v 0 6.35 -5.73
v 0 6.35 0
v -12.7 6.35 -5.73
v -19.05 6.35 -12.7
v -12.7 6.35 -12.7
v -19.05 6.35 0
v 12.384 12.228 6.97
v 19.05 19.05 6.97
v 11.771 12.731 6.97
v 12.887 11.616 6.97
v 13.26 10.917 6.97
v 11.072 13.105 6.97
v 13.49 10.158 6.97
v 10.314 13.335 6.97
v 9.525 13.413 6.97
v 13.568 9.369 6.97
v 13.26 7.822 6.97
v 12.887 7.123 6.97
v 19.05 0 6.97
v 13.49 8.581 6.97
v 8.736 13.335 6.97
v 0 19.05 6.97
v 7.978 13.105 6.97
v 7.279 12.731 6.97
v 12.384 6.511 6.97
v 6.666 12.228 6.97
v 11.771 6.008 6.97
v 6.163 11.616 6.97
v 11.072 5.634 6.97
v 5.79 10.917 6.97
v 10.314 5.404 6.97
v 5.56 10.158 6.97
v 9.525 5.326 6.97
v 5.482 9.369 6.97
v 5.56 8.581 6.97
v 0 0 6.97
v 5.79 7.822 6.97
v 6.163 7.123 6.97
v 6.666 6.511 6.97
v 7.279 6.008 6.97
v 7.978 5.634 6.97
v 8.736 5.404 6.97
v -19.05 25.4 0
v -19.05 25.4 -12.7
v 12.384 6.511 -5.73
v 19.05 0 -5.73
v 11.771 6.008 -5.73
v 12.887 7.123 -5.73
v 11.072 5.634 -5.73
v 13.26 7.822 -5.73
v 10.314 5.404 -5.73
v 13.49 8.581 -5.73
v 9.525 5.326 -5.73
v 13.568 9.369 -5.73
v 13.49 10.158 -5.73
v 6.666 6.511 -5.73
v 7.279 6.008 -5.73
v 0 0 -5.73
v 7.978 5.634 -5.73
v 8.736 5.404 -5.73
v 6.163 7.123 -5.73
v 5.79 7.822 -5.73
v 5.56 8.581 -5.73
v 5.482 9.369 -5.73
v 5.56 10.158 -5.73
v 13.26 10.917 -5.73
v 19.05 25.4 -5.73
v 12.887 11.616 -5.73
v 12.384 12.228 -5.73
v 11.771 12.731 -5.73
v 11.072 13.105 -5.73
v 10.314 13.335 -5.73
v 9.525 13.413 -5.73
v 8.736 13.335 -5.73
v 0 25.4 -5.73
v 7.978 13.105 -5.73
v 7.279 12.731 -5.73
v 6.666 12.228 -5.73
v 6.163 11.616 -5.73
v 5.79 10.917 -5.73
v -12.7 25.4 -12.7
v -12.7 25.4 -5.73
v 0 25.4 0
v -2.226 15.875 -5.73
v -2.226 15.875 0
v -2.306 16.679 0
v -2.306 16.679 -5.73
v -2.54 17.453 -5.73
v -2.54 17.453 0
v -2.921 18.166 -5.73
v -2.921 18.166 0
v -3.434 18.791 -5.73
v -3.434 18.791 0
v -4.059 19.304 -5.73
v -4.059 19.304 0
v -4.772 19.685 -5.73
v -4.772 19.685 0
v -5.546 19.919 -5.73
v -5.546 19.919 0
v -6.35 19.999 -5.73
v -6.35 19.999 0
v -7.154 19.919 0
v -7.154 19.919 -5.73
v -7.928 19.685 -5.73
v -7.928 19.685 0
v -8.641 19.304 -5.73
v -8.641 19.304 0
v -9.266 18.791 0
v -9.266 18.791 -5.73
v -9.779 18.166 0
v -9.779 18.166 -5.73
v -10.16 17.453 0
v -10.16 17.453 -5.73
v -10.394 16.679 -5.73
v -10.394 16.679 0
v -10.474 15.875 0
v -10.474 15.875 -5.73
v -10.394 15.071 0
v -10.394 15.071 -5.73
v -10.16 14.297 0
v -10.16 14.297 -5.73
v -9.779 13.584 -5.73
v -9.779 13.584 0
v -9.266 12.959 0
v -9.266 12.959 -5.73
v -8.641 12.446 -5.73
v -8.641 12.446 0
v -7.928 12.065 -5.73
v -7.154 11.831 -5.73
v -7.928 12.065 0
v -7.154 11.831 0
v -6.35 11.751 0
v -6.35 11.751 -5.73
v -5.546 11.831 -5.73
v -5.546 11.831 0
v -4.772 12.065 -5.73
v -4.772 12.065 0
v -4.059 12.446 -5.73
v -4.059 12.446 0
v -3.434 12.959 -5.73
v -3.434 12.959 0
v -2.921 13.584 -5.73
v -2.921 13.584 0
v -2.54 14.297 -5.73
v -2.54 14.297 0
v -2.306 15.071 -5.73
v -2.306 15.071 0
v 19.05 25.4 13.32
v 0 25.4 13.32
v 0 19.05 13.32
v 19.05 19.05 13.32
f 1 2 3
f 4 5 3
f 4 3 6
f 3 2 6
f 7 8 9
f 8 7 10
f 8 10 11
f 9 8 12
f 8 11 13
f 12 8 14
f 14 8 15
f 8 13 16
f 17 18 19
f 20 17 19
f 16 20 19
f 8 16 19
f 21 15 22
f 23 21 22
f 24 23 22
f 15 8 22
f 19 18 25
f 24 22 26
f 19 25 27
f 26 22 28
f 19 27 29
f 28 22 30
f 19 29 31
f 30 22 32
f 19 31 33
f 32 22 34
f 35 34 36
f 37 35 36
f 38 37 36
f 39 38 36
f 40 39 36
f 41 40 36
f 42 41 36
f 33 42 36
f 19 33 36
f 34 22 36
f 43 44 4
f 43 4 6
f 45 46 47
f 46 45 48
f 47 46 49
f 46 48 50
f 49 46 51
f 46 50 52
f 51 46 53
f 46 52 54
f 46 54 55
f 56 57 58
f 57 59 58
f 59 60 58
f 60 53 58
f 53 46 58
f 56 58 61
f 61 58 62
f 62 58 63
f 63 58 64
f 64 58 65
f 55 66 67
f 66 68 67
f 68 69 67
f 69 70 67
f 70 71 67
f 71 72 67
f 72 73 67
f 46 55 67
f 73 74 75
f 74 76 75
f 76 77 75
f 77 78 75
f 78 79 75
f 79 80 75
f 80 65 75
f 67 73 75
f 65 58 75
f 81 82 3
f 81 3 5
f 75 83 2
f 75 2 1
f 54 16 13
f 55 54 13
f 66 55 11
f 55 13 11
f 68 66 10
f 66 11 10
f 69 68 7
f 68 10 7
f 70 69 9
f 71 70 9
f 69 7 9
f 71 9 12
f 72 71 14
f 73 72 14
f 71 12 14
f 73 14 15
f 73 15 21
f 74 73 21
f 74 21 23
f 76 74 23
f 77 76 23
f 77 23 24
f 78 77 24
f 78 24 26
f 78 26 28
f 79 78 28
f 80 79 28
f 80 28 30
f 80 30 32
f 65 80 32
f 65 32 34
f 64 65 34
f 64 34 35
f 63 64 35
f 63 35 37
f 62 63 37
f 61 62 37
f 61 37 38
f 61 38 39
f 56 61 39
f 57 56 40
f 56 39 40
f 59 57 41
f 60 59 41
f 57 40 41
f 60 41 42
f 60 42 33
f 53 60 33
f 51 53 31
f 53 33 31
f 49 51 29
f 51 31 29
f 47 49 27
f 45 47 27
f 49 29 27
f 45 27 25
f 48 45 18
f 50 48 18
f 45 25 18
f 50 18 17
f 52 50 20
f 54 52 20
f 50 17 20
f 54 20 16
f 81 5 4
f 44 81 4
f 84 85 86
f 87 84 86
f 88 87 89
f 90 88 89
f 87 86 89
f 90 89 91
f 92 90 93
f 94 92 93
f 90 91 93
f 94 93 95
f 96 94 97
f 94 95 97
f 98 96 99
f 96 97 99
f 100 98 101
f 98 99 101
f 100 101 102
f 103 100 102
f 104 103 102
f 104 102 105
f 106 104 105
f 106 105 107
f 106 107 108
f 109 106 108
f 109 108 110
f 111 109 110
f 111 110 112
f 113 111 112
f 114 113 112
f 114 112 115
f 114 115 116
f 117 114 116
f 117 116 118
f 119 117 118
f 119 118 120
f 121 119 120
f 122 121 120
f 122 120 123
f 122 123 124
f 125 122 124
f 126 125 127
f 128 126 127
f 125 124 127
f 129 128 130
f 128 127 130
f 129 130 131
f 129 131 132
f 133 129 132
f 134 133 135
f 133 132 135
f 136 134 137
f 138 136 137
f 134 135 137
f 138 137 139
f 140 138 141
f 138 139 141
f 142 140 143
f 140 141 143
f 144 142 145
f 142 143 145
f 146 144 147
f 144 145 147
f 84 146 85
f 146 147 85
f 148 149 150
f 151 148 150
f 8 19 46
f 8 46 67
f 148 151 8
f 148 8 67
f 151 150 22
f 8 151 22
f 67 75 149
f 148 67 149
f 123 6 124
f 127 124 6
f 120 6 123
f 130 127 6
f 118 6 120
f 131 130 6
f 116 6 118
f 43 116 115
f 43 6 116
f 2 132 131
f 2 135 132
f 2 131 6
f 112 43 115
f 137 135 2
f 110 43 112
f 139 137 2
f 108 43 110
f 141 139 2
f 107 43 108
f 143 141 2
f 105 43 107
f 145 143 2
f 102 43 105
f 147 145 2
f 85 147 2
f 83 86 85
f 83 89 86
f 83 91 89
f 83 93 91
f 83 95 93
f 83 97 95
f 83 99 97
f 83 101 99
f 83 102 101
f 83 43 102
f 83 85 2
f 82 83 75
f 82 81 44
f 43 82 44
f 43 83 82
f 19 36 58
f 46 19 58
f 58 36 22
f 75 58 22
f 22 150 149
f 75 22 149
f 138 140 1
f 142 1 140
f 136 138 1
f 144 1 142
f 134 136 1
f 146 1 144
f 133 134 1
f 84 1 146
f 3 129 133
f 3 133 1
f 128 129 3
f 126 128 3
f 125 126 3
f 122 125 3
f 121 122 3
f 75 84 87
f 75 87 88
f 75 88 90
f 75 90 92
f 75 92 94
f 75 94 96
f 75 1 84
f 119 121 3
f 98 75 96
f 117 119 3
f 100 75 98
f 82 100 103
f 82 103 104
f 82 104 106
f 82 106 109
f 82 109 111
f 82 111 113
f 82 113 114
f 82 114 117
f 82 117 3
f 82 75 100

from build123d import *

# Parameters (mm, degrees)
F1_DEPTH = 19.05
F3_DEPTH = 19.05
F4_R     = 4.043165
F5_DEPTH = 25.4
F6_R     = 4.123579
F7_DEPTH = 25.4


with BuildPart() as f1:
    # F0 (on Right) → F1 (new body)
    with BuildSketch(Plane.YZ):
        Polygon((19.05, 6.970117), (0, 6.970117), (0, -5.729883), (25.4, -5.729883), (25.4, 13.320117), (19.05, 13.320117), align=None)
    extrude(amount=F1_DEPTH)

    # F4 (on face) → F5 (cut)
    with BuildSketch(Plane.XY.offset(6.970117)):
        with Locations((9.525, 9.369493)):
            Circle(F4_R)
    extrude(amount=-F5_DEPTH, mode=Mode.SUBTRACT)


with BuildPart() as f3:
    # F2 (on face) → F3 (new body)
    with BuildSketch(Plane(origin=(0, 25.4, 0), x_dir=(-1, 0, 0), z_dir=(0, 1, 0))):
        Polygon((0, 0), (0, -5.729883), (12.7, -5.729883), (12.7, -12.7), (19.05, -12.7), (19.05, 0), align=None)
    extrude(amount=-F3_DEPTH)

    # F6 (on face) → F7 (cut)
    with BuildSketch(Plane.XY):
        with Locations((-6.35, 15.875)):
            Circle(F6_R)
    extrude(amount=-F7_DEPTH, mode=Mode.SUBTRACT)


solid = Compound([f1.part, f3.part])
